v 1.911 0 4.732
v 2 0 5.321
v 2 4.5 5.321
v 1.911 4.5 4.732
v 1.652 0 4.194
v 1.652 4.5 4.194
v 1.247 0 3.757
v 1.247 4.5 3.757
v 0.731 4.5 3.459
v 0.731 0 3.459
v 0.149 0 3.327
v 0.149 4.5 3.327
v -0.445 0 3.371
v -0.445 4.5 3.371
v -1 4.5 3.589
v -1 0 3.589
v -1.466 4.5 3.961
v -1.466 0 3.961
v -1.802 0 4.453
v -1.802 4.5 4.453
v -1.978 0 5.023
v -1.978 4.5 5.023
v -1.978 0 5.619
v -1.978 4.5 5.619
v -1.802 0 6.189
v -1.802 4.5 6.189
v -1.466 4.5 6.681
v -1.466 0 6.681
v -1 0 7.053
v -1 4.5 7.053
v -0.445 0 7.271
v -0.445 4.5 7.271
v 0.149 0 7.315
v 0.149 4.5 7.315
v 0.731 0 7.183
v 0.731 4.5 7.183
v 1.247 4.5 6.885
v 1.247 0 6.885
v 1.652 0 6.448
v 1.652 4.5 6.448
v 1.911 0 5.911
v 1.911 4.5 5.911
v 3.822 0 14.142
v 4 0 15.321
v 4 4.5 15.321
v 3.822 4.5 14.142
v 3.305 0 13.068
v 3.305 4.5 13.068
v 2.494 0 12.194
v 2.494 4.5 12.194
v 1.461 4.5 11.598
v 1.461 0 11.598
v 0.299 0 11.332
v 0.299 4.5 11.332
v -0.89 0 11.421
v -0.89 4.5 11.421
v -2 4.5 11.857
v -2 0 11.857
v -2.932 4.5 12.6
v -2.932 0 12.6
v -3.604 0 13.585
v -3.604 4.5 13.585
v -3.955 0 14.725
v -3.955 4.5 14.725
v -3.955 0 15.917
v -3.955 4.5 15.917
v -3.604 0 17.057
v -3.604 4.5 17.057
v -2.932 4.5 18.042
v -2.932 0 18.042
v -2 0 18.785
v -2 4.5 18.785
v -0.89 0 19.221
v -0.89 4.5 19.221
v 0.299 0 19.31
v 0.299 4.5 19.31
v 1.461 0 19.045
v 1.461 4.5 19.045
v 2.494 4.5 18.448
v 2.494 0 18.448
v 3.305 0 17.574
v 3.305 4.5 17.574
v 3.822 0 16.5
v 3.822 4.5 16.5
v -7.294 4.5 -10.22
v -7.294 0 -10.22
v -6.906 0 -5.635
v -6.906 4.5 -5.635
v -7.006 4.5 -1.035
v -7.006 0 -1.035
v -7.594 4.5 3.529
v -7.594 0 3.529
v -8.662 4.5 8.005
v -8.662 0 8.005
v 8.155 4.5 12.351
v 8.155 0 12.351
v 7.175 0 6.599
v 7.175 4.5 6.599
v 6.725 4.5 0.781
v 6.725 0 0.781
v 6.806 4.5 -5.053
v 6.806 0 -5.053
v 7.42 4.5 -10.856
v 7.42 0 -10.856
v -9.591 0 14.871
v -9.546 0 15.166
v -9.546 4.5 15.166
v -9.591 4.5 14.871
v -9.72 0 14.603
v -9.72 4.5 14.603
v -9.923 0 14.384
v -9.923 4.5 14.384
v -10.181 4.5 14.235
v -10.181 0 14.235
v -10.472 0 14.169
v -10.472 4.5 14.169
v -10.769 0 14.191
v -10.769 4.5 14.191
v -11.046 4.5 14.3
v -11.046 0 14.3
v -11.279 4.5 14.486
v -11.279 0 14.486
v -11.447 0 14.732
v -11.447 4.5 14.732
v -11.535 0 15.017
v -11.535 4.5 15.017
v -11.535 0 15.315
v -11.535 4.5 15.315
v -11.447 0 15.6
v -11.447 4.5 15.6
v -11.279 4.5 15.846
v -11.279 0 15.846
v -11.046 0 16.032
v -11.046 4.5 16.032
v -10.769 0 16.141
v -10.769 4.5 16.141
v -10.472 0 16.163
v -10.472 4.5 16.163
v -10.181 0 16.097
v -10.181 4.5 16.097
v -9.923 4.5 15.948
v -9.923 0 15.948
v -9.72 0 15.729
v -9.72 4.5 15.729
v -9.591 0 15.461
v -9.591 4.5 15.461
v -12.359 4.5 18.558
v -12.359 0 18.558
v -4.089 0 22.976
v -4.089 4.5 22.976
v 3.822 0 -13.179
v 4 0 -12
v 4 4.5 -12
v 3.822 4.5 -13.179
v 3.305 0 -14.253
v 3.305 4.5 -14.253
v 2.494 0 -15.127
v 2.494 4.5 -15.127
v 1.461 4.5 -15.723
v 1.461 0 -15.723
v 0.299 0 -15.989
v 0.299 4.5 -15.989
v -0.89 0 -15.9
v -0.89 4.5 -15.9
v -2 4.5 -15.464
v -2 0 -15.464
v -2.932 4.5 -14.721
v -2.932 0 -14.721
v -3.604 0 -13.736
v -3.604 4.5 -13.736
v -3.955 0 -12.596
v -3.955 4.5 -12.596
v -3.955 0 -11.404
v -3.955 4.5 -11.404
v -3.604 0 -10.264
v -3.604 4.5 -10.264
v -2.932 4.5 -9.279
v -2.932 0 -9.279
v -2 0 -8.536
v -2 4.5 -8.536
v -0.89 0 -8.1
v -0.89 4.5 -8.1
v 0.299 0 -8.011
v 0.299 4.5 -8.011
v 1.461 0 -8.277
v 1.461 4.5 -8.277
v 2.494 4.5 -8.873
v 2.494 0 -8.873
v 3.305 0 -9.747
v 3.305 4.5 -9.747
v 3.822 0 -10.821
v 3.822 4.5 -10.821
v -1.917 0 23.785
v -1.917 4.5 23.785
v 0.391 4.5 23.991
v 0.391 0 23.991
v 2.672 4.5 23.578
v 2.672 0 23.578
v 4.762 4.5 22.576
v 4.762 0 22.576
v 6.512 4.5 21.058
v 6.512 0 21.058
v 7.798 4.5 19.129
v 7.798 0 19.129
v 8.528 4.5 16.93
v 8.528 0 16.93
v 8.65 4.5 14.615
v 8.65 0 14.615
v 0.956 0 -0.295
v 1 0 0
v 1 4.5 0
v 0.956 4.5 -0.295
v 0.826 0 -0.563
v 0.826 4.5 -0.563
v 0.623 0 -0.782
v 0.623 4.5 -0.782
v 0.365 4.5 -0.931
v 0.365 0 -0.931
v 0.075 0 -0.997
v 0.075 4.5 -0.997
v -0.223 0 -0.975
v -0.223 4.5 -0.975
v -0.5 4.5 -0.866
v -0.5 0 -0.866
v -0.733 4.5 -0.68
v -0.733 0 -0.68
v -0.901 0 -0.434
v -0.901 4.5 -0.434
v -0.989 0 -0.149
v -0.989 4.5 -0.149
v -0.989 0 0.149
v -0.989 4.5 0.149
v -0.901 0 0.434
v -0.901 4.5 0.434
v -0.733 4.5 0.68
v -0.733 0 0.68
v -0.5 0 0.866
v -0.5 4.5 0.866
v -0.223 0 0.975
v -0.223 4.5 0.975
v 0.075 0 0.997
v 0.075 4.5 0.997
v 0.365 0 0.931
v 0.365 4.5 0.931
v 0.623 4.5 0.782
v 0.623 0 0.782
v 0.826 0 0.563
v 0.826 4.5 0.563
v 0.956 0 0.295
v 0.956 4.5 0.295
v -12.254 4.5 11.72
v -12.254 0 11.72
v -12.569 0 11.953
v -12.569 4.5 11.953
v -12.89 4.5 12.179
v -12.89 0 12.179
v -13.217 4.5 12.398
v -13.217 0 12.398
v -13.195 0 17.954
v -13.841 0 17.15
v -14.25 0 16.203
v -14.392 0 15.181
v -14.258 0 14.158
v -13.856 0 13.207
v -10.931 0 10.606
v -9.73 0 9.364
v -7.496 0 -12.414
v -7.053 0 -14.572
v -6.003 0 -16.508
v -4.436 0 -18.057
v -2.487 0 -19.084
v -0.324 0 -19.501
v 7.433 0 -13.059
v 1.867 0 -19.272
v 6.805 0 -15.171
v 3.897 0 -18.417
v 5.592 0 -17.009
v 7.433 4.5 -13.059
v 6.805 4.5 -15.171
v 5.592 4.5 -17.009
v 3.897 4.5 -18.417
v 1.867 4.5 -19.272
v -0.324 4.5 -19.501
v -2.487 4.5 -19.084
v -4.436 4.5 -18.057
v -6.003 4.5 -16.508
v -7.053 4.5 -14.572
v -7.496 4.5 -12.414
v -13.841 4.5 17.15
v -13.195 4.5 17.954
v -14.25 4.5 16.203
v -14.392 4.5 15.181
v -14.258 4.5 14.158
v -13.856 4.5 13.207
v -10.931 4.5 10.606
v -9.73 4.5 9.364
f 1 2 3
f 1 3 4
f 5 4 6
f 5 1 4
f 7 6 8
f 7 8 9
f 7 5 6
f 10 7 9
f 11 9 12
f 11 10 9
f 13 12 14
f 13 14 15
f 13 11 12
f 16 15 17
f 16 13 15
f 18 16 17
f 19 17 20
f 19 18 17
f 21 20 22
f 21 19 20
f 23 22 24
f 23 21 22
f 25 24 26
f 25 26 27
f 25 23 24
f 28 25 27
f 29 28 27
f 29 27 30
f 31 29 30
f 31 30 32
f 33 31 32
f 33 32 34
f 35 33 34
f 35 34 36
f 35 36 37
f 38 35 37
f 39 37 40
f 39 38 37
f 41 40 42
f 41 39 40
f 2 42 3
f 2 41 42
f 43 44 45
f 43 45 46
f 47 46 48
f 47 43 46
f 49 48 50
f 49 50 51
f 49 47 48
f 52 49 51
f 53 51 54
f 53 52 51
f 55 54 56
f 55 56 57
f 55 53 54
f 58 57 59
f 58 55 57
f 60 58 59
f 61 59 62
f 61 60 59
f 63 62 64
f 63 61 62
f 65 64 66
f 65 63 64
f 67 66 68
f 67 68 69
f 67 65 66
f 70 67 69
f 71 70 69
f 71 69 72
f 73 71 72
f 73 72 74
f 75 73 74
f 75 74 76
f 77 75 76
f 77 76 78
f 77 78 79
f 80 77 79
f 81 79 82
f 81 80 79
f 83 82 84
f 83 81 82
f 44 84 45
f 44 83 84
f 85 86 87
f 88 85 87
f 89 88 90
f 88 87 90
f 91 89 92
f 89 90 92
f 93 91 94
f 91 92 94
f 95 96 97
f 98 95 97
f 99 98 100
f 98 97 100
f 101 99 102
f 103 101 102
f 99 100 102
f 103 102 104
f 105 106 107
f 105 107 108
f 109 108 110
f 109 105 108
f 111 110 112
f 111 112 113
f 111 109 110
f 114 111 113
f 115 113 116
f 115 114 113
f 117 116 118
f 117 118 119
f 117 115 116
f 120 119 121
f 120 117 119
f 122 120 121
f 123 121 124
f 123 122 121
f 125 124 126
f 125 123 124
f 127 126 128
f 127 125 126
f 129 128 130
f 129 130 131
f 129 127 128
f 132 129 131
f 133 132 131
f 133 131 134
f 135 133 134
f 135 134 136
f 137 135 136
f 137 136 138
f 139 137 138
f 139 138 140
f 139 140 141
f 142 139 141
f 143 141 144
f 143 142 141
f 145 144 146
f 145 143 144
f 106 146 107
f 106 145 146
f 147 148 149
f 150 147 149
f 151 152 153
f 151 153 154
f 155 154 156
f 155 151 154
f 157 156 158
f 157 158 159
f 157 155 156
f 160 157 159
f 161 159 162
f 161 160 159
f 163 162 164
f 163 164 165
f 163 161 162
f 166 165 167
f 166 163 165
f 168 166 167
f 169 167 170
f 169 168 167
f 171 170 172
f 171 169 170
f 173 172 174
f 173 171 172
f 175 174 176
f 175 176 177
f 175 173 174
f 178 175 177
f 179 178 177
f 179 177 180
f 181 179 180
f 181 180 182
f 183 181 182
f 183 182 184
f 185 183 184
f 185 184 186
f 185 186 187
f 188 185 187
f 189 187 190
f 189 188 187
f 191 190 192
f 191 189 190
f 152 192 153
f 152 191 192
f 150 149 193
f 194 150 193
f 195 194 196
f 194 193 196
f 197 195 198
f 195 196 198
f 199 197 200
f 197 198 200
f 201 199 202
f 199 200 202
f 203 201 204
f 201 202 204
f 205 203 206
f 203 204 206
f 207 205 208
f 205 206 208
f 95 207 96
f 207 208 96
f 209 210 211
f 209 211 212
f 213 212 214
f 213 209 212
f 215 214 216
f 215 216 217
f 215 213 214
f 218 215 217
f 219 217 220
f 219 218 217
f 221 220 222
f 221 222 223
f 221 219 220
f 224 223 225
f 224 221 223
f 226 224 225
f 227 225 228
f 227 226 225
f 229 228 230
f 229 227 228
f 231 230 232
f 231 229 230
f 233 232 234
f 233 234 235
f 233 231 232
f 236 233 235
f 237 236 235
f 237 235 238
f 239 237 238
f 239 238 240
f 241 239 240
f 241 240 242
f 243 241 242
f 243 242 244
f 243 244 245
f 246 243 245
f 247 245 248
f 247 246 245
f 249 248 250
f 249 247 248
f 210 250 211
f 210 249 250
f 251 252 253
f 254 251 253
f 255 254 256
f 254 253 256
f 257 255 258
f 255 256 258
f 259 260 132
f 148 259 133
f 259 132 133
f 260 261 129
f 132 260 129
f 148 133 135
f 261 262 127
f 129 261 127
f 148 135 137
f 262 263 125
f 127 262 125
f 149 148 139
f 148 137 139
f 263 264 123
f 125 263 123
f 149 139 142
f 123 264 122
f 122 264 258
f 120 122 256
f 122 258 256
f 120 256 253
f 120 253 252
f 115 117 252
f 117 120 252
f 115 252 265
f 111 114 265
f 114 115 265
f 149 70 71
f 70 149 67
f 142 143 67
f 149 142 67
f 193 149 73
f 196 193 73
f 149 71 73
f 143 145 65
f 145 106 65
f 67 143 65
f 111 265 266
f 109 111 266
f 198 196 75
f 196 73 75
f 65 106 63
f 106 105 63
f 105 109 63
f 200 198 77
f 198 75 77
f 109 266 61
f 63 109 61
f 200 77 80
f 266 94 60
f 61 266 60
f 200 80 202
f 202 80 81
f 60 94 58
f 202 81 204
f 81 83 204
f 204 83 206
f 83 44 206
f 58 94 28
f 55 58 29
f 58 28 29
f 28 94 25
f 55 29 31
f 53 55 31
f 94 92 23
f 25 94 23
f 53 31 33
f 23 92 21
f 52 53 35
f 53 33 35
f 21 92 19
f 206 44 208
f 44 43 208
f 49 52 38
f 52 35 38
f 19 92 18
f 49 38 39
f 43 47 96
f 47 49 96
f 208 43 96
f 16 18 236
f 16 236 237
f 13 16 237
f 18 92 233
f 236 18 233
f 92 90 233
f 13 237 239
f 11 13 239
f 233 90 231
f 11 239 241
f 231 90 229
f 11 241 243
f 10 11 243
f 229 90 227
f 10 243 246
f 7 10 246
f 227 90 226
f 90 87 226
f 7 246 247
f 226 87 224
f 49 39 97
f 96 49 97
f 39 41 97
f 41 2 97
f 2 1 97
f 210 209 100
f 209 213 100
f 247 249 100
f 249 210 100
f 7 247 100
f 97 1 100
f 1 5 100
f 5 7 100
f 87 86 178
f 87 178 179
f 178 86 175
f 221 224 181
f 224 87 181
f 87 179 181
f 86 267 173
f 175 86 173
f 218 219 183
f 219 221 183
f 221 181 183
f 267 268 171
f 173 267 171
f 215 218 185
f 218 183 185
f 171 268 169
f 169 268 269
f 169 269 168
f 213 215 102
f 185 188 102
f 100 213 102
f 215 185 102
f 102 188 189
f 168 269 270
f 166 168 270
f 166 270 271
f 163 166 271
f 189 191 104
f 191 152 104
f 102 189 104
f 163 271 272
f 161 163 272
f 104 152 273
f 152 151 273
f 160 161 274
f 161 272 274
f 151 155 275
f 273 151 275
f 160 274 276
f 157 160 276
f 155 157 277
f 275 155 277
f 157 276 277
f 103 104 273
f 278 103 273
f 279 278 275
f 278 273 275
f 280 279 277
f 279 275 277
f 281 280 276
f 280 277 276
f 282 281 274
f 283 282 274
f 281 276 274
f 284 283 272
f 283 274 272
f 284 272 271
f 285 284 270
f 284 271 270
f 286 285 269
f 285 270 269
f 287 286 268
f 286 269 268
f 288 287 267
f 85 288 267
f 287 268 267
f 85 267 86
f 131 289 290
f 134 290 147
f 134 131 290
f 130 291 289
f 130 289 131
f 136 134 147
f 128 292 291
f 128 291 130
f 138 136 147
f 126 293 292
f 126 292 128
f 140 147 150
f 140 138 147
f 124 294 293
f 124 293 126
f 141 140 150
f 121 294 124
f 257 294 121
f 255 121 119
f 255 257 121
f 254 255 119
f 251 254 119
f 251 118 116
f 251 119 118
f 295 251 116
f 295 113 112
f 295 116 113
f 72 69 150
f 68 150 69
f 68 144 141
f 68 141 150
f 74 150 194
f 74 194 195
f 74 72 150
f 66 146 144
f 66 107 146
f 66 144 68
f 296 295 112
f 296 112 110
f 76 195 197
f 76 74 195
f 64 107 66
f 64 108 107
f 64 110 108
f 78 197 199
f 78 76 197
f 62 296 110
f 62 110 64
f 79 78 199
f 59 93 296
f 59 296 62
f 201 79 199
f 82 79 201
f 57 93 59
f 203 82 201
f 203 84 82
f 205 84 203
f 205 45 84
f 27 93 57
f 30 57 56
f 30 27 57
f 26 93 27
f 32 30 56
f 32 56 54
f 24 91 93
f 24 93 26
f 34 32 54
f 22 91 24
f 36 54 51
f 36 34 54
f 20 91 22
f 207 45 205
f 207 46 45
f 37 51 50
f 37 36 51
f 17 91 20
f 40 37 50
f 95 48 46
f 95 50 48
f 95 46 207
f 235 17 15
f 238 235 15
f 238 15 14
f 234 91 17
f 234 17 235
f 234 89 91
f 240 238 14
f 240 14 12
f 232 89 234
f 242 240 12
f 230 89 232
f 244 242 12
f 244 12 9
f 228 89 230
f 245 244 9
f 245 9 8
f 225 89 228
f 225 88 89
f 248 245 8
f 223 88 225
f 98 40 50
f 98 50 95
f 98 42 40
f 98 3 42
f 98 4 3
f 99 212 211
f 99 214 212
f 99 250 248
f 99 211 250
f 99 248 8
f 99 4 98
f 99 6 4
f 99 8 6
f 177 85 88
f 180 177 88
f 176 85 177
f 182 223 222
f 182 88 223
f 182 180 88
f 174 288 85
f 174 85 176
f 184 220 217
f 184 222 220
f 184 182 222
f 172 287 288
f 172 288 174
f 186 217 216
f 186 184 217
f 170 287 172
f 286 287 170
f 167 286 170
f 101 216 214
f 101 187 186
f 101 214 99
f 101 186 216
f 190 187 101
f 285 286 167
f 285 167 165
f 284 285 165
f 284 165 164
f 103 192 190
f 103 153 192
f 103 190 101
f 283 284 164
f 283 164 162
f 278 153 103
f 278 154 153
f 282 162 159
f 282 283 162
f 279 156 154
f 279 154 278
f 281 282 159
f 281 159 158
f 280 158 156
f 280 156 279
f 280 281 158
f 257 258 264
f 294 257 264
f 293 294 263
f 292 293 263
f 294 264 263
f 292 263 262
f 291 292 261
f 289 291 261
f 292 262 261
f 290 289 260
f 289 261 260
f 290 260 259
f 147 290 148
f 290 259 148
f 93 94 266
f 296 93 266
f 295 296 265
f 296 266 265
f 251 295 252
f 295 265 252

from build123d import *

# Parameters (mm, degrees)
SKETCH1_R           = 1
SKETCH1_R_2         = 4
SKETCH1_R_3         = 2
BOSS_EXTRUDE1_DEPTH = 4.5


with BuildPart() as part:
    # Sketch1 → Boss-Extrude1 (new body)
    with BuildSketch(Plane(origin=(0, 0, 0), x_dir=(1, 0, 0), z_dir=(0, 1, 0))):
        with BuildLine():
            ThreePointArc((-13.216577068, -12.398039355), (-14.355594067, -15.696551109), (-12.358546854, -18.55825374))
            Line((-12.358546854, -18.55825374), (-4.089079858, -22.975728551))
            ThreePointArc((-4.089079858, -22.975728551), (5.687833956, -21.875689807), (8.154517998, -12.351321125))
            ThreePointArc((8.154517998, -12.351321125), (6.724685531, -0.7813357), (7.419863607, 10.855919606))
            ThreePointArc((7.419863607, 10.855919606), (-0.324076795, 19.500551353), (-7.293531269, 10.220197086))
            ThreePointArc((-7.293531269, 10.220197086), (-7.006184901, 1.034726978), (-8.662387246, -8.004765421))
            ThreePointArc((-8.662387246, -8.004765421), (-10.314906991, -10.000536559), (-12.253567388, -11.719699089))
            ThreePointArc((-12.253567388, -11.719699089), (-12.729149831, -12.067276987), (-13.216577068, -12.398039355))
        make_face()
        with Locations((-10.546429397, -15.165988669)):
            Circle(SKETCH1_R, mode=Mode.SUBTRACT)
        with Locations((0, -15.321013501)):
            Circle(SKETCH1_R_2, mode=Mode.SUBTRACT)
        with Locations((0, -5.321013501)):
            Circle(SKETCH1_R_3, mode=Mode.SUBTRACT)
        Circle(SKETCH1_R, mode=Mode.SUBTRACT)
        with Locations((-3e-08, 12)):
            Circle(SKETCH1_R_2, mode=Mode.SUBTRACT)
    extrude(amount=BOSS_EXTRUDE1_DEPTH)


solid = part.part
